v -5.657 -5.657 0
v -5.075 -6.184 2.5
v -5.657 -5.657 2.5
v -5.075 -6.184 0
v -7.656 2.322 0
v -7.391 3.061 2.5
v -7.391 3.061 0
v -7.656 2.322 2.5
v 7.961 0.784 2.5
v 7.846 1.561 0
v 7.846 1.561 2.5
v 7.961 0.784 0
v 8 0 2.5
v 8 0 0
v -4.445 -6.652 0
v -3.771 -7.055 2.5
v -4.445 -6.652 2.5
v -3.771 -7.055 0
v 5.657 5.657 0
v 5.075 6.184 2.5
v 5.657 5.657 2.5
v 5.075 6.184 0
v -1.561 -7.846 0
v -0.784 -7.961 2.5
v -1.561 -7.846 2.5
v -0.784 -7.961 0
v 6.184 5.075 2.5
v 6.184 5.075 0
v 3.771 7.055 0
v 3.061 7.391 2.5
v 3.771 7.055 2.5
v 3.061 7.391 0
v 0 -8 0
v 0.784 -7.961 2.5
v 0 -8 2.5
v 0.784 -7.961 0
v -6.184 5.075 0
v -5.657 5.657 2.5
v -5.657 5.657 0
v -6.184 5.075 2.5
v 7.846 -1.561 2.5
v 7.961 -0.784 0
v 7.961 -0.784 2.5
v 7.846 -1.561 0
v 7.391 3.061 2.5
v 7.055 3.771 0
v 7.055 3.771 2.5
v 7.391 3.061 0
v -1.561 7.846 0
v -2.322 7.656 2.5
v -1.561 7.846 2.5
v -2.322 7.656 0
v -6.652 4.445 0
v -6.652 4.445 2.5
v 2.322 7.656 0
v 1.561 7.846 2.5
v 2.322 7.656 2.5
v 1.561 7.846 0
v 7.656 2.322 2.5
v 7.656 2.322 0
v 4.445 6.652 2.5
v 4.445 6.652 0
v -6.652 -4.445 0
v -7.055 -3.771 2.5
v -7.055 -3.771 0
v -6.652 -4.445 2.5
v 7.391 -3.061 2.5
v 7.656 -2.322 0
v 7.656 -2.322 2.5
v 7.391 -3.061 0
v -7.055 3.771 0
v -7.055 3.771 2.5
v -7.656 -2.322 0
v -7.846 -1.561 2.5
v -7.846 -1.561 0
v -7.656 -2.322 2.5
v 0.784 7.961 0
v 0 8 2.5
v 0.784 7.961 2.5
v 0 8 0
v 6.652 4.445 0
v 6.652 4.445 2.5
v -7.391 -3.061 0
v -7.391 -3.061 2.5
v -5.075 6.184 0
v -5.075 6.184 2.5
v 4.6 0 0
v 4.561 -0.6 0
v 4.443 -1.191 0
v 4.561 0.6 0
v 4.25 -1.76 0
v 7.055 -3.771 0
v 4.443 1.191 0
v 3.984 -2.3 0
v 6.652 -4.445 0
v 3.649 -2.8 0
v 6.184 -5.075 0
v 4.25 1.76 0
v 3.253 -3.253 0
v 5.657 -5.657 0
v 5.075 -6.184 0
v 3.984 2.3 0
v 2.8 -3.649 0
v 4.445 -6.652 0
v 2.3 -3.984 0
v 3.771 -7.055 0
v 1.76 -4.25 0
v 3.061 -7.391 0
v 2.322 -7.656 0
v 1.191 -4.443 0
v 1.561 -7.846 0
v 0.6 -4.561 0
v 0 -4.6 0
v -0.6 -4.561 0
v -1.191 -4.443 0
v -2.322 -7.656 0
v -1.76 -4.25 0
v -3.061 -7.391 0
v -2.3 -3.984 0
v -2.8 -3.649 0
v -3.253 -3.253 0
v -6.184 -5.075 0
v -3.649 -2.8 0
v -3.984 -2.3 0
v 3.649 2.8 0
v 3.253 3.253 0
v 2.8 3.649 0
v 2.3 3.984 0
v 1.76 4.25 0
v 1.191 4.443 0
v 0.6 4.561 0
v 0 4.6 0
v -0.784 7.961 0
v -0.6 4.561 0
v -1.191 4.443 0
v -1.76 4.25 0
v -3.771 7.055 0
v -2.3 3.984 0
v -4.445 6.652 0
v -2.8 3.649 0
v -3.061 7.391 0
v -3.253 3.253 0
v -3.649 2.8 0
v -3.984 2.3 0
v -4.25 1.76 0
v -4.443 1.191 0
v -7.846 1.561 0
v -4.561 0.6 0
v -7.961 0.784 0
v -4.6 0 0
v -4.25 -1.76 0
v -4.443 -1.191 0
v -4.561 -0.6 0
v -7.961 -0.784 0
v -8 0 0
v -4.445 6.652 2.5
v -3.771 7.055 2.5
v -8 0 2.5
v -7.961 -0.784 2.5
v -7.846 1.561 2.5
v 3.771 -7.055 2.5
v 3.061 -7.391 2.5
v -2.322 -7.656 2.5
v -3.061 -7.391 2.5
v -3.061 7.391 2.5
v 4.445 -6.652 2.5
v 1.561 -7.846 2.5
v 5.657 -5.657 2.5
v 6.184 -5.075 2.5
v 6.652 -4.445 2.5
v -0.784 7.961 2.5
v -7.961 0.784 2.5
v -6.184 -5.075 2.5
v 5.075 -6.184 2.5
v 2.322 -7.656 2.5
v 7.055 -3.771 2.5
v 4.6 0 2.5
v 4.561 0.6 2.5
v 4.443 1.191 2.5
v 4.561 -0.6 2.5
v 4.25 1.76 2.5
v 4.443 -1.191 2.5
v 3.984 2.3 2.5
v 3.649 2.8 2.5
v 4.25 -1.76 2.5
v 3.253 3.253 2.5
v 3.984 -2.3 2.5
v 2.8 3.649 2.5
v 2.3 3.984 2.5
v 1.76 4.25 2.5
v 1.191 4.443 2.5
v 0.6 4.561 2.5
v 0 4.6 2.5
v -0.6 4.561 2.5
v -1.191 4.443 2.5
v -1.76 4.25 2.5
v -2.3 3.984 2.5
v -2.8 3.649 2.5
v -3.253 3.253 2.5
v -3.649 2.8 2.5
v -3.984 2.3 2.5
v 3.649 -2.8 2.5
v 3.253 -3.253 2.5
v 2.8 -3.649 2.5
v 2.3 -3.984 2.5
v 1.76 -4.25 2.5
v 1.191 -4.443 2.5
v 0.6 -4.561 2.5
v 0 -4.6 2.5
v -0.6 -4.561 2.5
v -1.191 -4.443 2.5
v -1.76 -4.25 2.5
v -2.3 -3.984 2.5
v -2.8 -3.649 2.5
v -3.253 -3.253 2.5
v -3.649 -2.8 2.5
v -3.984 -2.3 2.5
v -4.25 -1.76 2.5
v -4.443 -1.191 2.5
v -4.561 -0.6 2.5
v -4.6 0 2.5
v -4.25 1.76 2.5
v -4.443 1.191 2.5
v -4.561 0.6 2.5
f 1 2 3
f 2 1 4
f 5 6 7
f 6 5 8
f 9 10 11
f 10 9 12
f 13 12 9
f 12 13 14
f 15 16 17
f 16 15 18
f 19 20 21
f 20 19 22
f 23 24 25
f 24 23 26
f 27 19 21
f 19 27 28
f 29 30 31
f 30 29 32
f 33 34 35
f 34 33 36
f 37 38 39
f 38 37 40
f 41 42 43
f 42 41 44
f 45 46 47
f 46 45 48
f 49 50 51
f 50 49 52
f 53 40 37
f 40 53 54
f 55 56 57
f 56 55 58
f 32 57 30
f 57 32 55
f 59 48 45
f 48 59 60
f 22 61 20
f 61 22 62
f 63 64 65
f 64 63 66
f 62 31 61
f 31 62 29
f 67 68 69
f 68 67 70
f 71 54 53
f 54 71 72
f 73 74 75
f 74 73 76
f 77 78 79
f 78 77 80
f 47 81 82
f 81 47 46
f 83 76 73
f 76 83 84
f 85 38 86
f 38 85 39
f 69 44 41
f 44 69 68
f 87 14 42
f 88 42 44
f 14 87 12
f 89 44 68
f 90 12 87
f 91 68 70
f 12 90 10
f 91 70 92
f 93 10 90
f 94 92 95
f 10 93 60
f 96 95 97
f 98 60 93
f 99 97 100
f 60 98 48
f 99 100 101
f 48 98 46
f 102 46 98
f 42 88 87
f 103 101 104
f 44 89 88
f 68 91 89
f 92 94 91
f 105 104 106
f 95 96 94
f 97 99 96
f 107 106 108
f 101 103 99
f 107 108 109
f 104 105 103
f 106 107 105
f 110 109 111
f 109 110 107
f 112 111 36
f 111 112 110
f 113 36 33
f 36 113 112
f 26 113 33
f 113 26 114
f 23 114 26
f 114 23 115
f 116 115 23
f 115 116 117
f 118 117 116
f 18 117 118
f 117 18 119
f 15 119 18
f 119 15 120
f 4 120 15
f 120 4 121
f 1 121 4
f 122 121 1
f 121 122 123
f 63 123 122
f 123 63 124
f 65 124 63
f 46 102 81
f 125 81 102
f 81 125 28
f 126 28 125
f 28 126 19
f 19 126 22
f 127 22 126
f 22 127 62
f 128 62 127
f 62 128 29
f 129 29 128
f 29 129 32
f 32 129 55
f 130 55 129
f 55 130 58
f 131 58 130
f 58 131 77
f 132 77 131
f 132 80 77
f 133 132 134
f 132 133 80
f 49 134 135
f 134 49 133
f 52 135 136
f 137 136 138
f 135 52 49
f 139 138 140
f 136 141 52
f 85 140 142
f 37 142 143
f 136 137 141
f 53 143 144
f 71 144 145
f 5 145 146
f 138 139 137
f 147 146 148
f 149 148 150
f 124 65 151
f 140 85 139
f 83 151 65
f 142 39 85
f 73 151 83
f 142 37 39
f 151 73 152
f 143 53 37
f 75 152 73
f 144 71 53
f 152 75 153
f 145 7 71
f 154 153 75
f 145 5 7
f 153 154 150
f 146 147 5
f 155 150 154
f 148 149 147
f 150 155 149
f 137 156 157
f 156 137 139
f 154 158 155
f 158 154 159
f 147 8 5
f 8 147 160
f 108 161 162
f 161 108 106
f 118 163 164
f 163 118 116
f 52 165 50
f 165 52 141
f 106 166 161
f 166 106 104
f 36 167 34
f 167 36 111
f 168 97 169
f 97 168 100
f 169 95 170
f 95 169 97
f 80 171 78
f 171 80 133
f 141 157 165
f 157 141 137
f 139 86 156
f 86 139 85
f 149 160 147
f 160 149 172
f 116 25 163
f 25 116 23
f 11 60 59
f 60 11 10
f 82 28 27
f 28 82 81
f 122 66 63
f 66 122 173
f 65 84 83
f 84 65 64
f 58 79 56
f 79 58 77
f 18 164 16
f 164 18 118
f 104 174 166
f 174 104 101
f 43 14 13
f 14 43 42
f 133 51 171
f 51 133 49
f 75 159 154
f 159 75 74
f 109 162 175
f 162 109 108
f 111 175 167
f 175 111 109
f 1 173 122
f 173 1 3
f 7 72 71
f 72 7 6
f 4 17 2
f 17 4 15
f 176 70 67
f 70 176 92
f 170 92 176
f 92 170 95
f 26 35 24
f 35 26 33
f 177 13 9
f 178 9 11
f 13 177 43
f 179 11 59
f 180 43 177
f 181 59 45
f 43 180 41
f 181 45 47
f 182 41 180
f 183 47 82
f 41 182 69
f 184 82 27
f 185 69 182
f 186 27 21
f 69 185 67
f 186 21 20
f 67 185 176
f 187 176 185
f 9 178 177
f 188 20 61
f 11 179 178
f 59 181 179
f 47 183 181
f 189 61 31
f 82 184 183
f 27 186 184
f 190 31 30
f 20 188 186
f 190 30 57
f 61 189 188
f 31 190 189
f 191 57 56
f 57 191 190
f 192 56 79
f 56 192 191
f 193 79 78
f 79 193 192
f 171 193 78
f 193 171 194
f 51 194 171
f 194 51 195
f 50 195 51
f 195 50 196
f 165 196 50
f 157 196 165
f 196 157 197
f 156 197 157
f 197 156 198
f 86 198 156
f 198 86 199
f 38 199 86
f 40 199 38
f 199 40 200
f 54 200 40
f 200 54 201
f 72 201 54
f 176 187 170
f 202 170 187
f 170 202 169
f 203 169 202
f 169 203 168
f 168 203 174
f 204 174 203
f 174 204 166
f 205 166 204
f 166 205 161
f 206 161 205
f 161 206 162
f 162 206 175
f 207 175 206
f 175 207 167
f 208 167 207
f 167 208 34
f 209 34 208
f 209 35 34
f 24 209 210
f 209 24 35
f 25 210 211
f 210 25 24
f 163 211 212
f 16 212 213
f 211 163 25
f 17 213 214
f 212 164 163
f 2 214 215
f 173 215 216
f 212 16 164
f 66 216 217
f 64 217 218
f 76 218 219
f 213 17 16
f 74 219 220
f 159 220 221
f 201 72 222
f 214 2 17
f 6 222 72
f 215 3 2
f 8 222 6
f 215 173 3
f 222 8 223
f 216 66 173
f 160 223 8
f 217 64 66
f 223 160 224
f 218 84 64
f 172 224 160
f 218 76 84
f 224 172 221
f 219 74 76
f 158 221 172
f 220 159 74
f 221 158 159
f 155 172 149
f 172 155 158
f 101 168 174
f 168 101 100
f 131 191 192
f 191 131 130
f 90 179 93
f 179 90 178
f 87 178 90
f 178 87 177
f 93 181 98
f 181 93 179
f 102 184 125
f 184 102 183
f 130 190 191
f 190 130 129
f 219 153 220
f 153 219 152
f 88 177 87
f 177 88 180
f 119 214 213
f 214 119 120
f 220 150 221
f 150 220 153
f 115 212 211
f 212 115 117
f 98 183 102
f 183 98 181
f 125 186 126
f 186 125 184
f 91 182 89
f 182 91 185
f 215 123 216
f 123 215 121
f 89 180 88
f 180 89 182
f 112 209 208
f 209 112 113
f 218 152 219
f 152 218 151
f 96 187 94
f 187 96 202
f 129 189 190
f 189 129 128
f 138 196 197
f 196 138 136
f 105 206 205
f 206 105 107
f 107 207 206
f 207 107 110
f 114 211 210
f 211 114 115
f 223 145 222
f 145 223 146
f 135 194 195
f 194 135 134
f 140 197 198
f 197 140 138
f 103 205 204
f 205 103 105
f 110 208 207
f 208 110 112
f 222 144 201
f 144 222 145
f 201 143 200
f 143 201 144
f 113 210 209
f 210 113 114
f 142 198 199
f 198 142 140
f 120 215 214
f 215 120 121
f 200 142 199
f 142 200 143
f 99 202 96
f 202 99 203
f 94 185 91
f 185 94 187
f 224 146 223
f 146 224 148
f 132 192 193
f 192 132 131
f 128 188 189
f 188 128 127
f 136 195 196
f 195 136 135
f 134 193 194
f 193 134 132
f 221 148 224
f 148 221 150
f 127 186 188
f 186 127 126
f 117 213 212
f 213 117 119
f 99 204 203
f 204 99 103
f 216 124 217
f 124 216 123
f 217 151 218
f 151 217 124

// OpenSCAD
include <../lib/solar-node-lib.scad>;
$fn = 40;
shaft_seal();
